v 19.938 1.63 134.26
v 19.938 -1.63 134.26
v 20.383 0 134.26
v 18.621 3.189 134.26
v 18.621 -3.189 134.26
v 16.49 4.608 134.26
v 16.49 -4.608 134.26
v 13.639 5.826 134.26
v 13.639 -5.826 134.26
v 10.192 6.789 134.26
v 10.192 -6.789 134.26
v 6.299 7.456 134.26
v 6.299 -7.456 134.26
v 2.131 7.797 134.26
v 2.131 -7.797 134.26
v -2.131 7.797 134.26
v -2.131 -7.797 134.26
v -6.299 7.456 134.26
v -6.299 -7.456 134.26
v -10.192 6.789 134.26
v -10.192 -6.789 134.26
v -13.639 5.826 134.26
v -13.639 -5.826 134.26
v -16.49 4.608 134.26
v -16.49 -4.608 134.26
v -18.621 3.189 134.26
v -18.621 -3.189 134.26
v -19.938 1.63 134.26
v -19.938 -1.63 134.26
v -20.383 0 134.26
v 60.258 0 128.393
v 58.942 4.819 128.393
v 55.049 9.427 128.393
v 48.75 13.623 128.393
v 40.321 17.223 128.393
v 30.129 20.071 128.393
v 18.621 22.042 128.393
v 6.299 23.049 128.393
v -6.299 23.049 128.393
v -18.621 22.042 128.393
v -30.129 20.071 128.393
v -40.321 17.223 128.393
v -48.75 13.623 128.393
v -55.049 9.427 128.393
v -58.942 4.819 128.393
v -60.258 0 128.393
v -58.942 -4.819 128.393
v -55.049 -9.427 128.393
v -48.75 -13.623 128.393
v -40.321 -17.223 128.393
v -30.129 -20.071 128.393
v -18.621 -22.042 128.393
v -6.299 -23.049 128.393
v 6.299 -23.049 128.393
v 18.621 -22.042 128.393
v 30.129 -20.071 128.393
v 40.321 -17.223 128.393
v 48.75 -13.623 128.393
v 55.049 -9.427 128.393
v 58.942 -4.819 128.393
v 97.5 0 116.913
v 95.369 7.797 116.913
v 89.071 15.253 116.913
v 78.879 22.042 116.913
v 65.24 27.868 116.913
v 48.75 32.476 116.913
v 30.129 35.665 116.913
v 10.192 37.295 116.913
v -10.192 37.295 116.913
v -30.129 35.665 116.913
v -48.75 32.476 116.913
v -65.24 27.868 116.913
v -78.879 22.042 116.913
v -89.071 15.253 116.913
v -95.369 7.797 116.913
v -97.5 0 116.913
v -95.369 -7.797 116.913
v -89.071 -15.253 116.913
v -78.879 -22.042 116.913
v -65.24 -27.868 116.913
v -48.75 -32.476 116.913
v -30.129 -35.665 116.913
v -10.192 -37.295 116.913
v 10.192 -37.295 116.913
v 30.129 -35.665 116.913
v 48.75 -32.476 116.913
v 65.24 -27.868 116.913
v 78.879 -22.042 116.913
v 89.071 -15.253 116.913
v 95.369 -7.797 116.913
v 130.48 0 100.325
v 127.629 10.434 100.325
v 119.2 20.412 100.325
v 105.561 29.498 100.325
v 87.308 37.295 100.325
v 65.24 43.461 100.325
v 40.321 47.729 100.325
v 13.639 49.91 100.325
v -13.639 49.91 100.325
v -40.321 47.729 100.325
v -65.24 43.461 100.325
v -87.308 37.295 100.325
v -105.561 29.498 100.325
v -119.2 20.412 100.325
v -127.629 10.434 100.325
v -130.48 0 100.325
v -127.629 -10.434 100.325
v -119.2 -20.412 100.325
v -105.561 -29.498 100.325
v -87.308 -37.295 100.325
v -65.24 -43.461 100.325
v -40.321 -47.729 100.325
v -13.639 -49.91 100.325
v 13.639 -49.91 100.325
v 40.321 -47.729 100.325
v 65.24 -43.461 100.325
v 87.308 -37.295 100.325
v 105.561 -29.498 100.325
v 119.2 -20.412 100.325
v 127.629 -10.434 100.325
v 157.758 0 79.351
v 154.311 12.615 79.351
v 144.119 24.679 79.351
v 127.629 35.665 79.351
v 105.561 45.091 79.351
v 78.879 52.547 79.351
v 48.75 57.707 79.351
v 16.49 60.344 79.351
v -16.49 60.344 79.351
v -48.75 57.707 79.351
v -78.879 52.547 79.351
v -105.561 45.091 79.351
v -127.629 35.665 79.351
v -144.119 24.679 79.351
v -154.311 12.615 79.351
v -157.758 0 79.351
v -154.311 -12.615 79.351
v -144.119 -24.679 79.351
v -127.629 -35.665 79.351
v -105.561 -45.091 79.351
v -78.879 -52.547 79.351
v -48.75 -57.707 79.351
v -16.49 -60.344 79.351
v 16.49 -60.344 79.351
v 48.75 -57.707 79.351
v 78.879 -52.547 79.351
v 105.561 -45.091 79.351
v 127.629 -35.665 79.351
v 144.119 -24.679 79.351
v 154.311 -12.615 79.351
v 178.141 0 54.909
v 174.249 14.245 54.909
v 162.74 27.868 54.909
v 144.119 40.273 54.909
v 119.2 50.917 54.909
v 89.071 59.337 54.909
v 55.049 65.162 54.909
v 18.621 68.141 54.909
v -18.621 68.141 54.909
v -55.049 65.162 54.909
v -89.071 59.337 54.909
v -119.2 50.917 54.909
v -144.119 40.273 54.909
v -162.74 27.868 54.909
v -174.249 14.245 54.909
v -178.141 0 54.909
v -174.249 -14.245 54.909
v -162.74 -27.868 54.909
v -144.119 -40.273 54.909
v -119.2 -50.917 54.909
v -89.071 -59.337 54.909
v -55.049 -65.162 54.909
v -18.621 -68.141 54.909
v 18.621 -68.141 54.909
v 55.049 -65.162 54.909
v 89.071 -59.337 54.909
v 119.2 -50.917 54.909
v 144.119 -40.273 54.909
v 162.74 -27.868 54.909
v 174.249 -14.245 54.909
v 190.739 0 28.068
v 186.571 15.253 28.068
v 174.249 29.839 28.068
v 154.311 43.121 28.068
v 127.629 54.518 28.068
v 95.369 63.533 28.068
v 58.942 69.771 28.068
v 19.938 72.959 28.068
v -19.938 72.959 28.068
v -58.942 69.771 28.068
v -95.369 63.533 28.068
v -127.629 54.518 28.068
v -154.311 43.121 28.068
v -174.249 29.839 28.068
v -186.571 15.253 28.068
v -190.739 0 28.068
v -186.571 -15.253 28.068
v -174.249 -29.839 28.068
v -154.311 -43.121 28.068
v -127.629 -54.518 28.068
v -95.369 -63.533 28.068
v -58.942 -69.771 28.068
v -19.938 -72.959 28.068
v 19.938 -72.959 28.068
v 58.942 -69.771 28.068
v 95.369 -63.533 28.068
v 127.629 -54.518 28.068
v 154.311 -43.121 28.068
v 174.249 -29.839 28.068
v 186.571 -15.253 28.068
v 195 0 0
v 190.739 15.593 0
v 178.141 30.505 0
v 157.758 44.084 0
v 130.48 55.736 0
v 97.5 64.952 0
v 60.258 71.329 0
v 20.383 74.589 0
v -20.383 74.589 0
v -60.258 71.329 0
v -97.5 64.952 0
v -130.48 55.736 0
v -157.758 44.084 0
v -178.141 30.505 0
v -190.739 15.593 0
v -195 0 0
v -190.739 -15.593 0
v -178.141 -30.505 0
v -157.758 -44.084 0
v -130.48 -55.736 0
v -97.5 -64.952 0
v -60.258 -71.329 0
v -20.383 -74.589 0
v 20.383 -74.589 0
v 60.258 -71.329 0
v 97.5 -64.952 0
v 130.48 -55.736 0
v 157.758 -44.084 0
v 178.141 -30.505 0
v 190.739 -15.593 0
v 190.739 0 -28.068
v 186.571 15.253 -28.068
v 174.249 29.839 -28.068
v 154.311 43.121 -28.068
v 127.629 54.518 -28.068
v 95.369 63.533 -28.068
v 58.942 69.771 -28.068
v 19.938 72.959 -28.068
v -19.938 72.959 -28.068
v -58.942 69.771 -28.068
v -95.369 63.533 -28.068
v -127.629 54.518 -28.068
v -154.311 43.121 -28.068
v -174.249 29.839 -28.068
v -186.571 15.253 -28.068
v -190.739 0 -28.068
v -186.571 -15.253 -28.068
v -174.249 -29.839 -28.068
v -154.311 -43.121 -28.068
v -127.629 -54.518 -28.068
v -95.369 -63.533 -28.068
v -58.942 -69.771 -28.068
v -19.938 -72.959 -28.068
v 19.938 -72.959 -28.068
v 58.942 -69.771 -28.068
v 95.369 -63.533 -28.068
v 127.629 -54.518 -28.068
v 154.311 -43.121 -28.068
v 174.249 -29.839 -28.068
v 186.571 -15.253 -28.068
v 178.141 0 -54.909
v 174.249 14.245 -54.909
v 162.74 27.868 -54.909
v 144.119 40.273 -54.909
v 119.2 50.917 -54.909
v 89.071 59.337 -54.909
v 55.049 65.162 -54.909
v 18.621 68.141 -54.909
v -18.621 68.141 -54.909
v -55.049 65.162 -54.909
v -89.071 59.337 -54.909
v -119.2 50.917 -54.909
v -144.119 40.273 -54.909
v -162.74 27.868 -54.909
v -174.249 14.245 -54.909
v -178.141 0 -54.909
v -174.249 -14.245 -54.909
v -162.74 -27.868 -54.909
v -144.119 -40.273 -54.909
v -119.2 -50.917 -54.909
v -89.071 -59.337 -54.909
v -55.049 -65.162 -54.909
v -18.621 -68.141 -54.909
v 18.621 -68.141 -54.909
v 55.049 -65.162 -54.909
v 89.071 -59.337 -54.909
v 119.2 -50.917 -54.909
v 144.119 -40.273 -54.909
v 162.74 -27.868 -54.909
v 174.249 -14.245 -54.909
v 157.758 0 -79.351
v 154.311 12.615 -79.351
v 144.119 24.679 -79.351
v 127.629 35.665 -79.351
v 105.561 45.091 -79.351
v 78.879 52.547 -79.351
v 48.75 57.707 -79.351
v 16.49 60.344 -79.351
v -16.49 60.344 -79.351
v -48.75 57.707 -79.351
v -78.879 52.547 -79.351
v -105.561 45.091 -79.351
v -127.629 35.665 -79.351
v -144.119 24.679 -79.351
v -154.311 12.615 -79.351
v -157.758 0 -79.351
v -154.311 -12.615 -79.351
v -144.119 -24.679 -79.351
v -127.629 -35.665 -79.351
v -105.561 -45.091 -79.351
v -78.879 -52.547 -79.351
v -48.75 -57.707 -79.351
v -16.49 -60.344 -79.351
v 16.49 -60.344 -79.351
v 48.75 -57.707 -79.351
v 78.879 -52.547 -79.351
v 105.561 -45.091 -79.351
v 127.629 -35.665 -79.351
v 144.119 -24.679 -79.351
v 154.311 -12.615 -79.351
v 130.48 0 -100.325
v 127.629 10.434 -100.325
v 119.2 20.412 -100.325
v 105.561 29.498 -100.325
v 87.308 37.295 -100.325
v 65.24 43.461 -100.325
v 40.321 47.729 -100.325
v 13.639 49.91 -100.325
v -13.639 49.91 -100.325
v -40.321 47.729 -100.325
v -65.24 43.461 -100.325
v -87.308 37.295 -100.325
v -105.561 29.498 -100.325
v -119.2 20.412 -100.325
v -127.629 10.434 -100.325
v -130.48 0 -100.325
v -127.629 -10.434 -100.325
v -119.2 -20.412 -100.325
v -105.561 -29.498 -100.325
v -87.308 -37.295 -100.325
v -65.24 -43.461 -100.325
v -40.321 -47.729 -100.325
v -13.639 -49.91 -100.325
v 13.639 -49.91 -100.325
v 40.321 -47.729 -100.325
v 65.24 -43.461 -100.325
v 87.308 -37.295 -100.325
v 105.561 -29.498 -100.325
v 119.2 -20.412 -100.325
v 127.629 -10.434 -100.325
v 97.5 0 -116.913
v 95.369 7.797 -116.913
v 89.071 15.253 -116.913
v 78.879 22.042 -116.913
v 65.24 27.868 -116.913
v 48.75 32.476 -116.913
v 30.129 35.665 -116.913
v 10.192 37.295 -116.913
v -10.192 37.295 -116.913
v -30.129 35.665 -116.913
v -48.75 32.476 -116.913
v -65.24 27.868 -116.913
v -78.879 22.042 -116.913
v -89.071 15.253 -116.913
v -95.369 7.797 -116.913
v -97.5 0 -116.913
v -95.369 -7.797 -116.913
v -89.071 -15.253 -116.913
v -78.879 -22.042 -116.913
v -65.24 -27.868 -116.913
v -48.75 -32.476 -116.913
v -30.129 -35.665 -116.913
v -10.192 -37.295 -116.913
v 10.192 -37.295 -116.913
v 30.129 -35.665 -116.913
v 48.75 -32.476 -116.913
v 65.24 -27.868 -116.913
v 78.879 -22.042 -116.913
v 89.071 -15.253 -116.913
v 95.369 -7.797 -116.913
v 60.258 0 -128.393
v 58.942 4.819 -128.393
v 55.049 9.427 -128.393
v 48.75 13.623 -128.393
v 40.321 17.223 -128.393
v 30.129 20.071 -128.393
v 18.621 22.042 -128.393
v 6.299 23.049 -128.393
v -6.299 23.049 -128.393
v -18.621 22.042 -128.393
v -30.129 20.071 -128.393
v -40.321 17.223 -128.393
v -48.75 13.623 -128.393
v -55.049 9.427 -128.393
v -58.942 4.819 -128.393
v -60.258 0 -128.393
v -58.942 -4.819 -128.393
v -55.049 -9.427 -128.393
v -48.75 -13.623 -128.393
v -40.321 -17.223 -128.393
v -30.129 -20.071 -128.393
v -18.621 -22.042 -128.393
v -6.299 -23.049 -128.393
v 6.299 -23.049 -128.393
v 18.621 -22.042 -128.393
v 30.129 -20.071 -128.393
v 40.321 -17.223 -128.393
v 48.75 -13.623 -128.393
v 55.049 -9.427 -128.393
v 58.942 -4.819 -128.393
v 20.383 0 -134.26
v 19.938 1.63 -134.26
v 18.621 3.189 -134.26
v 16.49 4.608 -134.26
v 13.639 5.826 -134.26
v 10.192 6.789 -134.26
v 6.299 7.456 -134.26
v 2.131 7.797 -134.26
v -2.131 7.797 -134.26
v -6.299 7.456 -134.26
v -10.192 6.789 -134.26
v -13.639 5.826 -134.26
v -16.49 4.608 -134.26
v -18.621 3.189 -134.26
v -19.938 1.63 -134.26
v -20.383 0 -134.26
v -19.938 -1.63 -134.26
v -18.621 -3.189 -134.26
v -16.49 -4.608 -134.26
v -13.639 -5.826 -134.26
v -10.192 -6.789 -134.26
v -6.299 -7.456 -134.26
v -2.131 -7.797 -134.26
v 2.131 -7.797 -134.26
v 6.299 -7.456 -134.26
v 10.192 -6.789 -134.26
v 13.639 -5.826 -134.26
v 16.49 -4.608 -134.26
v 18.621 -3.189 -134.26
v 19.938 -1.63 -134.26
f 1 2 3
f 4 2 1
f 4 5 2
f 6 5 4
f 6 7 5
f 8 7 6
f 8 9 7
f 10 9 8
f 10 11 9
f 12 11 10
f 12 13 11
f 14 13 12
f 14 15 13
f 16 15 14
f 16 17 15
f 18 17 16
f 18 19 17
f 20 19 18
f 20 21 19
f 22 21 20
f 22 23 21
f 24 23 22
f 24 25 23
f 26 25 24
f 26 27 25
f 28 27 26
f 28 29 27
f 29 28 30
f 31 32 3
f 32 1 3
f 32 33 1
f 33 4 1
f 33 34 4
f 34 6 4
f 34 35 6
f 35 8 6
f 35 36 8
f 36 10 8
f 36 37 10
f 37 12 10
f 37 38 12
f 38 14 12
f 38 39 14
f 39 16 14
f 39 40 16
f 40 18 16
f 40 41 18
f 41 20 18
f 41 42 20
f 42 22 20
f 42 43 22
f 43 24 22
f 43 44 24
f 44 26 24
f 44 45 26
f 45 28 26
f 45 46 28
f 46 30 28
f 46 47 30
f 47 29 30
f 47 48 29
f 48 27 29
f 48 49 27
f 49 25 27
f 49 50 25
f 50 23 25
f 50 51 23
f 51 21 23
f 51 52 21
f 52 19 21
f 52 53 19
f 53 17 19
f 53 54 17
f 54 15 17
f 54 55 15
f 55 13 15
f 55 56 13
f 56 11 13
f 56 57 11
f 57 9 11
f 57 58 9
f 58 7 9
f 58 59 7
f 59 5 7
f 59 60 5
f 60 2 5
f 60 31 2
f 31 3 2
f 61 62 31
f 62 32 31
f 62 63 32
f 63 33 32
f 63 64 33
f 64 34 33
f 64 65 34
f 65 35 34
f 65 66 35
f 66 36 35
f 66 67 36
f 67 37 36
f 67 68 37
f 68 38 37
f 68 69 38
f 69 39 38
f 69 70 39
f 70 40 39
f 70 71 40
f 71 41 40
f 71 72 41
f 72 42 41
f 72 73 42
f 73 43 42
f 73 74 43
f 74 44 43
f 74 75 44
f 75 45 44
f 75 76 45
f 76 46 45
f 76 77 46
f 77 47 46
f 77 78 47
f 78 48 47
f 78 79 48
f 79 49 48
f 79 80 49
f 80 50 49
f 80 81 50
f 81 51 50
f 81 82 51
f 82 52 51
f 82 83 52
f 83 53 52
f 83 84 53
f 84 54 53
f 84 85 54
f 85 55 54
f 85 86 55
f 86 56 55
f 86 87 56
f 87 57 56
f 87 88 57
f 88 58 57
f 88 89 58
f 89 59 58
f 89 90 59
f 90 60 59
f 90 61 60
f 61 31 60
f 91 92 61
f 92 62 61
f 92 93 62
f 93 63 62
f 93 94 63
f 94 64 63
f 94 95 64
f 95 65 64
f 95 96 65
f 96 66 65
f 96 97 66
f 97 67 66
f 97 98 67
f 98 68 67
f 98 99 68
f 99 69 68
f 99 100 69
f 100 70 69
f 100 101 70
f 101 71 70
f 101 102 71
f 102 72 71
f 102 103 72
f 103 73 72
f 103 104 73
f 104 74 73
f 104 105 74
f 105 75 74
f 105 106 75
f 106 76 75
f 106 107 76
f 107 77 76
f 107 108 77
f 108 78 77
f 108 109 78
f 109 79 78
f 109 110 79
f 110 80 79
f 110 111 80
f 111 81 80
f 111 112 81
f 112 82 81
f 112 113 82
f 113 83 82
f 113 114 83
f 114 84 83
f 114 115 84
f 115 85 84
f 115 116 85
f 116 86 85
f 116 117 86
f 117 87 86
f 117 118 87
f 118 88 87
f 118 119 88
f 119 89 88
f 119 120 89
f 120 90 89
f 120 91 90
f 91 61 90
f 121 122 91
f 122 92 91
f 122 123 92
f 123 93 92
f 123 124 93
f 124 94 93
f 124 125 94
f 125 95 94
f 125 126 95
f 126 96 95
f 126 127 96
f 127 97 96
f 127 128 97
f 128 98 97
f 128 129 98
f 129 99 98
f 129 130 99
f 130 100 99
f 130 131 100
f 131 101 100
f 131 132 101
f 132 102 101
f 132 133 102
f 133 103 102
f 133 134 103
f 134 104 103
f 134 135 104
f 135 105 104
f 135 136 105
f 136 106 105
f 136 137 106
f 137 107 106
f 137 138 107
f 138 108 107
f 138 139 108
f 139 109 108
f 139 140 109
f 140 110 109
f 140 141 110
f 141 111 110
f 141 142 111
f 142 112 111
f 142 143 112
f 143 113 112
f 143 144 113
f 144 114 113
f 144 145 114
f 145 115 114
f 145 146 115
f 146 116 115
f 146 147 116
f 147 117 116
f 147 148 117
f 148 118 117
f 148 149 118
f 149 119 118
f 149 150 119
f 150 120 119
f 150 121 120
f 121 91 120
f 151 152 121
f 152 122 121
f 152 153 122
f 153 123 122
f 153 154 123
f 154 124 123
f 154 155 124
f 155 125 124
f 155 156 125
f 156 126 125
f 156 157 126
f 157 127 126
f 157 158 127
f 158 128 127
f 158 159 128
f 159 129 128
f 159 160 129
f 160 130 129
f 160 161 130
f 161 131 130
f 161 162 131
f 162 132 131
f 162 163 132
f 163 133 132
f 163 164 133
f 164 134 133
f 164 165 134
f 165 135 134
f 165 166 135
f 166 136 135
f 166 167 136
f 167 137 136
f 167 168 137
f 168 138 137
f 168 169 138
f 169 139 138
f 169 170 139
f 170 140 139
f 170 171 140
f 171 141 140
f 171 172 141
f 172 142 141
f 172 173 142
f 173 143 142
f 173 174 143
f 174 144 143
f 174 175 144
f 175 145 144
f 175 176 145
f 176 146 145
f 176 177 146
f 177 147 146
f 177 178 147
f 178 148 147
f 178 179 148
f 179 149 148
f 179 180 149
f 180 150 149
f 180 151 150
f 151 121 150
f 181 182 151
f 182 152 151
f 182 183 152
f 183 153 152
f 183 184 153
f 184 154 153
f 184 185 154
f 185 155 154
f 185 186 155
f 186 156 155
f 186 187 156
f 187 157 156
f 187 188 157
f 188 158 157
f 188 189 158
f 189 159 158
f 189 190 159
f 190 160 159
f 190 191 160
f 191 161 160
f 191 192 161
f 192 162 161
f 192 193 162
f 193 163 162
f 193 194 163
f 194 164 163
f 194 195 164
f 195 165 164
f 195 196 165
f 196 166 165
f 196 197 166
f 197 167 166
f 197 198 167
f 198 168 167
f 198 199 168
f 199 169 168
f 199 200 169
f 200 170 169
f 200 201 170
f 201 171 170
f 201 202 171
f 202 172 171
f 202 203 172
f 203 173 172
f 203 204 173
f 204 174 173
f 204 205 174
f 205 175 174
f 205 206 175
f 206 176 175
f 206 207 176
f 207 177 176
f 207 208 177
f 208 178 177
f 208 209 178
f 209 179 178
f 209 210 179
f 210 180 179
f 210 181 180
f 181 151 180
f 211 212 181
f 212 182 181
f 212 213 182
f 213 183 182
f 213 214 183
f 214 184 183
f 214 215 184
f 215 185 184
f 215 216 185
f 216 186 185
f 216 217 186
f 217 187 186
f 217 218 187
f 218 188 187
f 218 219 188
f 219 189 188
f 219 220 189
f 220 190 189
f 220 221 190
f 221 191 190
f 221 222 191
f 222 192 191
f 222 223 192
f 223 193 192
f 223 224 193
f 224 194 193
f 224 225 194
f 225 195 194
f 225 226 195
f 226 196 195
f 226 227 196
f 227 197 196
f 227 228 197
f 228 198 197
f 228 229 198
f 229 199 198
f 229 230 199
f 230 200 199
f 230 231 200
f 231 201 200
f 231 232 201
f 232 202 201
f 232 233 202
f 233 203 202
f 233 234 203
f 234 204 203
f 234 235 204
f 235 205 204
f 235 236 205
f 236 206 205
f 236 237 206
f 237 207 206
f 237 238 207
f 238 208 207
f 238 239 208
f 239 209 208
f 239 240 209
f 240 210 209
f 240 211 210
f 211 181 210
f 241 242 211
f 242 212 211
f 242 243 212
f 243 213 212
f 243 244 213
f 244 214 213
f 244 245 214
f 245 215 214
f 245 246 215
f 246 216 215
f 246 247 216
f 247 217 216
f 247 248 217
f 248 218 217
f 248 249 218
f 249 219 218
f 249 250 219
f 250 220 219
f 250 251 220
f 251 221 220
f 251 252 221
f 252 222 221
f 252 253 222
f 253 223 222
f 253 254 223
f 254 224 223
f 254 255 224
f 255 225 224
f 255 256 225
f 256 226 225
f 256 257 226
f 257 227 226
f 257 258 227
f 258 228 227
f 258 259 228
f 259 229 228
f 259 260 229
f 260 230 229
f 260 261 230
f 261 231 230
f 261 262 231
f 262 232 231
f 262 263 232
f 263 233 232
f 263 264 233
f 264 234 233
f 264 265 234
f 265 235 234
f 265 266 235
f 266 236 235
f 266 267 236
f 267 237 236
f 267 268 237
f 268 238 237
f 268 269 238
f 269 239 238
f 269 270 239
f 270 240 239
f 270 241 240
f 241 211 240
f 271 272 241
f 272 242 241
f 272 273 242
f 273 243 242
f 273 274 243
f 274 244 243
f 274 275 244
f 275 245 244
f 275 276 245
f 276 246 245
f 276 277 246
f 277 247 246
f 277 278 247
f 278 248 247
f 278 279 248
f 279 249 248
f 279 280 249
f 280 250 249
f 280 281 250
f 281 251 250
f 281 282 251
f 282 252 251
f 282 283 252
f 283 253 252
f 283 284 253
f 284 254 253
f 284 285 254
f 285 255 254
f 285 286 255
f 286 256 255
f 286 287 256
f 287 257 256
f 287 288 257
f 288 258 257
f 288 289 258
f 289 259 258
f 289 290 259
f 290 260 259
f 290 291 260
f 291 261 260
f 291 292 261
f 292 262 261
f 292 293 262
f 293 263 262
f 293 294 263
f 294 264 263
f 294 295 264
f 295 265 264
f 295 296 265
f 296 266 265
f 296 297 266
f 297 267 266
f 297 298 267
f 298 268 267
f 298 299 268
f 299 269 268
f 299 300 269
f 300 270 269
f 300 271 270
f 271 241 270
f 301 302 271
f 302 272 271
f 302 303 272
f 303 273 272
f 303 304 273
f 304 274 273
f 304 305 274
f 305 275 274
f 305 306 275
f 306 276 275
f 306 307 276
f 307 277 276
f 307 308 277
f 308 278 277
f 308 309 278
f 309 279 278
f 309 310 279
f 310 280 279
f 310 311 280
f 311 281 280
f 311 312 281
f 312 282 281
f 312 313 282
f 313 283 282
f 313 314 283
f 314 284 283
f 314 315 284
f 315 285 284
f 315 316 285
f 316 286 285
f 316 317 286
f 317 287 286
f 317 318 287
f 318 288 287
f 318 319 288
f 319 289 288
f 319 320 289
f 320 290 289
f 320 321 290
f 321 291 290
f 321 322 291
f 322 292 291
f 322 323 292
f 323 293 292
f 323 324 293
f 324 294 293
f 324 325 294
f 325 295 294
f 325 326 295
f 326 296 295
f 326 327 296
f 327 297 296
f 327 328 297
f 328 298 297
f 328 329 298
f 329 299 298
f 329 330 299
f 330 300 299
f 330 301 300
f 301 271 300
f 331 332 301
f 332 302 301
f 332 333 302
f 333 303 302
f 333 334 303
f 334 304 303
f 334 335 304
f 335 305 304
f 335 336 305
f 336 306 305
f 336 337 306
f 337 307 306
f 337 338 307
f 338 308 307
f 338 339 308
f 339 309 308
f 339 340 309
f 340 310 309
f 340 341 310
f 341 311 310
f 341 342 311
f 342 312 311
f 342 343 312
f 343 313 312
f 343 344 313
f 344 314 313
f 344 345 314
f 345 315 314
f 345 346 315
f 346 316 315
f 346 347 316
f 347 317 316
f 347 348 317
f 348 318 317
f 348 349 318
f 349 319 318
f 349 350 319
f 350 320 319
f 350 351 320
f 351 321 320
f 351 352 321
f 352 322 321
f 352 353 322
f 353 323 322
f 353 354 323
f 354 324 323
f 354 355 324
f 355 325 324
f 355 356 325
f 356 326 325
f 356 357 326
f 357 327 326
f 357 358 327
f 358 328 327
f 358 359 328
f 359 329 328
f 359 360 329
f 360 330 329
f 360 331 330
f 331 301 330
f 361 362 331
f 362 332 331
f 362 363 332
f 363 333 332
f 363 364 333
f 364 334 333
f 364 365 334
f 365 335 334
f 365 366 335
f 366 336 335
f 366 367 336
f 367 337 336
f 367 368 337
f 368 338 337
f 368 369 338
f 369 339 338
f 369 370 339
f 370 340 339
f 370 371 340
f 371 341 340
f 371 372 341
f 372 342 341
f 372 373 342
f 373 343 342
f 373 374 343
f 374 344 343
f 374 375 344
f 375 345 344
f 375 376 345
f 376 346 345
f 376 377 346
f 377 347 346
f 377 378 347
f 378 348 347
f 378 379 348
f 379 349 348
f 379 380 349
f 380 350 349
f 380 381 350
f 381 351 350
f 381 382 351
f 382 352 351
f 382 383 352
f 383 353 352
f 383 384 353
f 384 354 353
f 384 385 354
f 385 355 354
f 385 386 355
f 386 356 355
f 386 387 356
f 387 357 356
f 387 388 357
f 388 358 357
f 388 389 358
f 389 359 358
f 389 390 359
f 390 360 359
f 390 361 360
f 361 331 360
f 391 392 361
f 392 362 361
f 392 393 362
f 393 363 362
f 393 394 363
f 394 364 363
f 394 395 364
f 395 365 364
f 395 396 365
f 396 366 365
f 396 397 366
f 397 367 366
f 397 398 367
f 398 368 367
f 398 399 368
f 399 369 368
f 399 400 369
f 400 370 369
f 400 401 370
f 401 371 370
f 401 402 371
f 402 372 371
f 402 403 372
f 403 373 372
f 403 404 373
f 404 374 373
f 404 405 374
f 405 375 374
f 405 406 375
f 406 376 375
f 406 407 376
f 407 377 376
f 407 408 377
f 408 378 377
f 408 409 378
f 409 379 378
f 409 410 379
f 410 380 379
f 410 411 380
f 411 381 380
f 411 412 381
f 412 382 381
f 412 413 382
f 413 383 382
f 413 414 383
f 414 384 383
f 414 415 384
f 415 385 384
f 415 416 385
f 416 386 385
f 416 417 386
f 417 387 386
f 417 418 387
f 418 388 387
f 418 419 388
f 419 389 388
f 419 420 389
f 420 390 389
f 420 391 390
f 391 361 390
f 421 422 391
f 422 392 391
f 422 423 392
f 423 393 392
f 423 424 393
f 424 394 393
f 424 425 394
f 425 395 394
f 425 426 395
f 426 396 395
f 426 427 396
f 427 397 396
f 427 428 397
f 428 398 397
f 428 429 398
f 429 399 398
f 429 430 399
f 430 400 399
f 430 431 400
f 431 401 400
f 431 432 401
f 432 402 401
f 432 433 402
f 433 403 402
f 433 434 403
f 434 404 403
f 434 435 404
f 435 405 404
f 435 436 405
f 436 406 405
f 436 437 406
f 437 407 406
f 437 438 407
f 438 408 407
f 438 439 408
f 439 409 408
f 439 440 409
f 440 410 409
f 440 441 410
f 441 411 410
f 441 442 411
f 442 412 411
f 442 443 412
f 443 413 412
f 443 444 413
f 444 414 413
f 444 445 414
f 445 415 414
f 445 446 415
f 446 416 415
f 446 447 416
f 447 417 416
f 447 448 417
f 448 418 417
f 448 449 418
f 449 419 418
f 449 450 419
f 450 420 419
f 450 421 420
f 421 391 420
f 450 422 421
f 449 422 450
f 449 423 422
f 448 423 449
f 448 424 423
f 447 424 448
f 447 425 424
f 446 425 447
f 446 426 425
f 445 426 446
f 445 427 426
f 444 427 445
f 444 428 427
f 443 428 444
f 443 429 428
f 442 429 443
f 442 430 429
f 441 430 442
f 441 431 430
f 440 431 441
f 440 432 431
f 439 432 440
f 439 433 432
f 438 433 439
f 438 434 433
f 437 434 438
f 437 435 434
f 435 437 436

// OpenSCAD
// Generated by SolidPython 1.0.1 on 2020-07-29 00:46:50


scale(v = [13, 5, 9]) {
	sphere(r = 15);
}
/***********************************************
*********      SolidPython code:      **********
************************************************
 
# import packages: SolidPython
from solid import *
from solid.utils import *
from itertools import chain, combinations, permutations


class Resize:

    def __init__(self, scad_file):
        self.scad_file = scad_file
        #self.scad_file = import_scad(scad_file)
        # cone/cylinder param:
        self.r1 = 0
        self.r2 = 0
        self.h = 0
        # rectangular prism param:
        self.w = 0
        self.l = 0
        # ellipse param:
        self.r = 0

    # import OpenScad code (file name corresponds to shape)


    # classify shape + parameters
    def assign(self, param1, param2, param3):
        if self.scad_file == 'cone.scad':
            self.r1 = param1
            self.r2 = param2
            self.h = param3
        elif self.scad_file == 'cylinder.scad':
            self.r1 = param1
            self.r2 = param2
            self.h = param3
        elif self.scad_file == 'rectangularPrism.scad':
            self.h = param1
            self.l = param2
            self.w = param3
        else:
            self.r = param1
            self.h = param2

    # resize parameters
    def iterate(self):
        x = range(3, 20, 2)
        i = 1
        if self.scad_file == 'cone.scad':
            tempList = list(permutations(x, 2))
            for temp in tempList:
                param1 = temp[0]
                param2 = temp[1]
                filepath = 'produced_scad_files/' + 'cone' + str(param1) + '_' + str(param2) + '_' + '.scad'
                scad_render_to_file(cylinder(h=param1, r1=param2, r2=0), filepath)

        elif self.scad_file == 'cylinder.scad':
            tempList = list(permutations(x, 3))
            for temp in tempList:
                param1 = temp[0]
                param2 = temp[1]
                filepath = 'produced_scad_files/' + 'cylinder' + str(param1) + '_' + str(param2) + '_' + '.scad'
                scad_render_to_file(cylinder(h=param1, r1=param2, r2=param2), filepath)

        elif self.scad_file == 'rectangularPrism.scad':
            tempList = list(permutations(x, 3))
            for temp in tempList:
                param1 = temp[0]
                param2 = temp[1]
                param3 = temp[2]
                filepath = 'produced_scad_files/' + 'rectangularPrism' + str(param1) + '_' + str(param2) + '_' + str(
                    param3) + '.scad'
                scad_render_to_file(cube(size=(param1, param2, param3)), filepath)

        elif self.scad_file == 'ellipse.scad':
            tempList = list(permutations(x, 4))
            for temp in tempList:
                param1 = temp[0]
                param2 = temp[1]
                param3 = temp[2]
                param4 = temp[3]
                filepath = 'produced_scad_files/' + 'ellipse' + str(param1) + '_' + str(param2) + '_' + str(param3) + '_' + str(param4) + '.scad'
                scad_render_to_file(scale([param1, param2, param3])(sphere(r=param4)), filepath)

    def render_to_scadfile(self):
        scad_render_to_file(scad, 'example.scad') 
 
************************************************/
